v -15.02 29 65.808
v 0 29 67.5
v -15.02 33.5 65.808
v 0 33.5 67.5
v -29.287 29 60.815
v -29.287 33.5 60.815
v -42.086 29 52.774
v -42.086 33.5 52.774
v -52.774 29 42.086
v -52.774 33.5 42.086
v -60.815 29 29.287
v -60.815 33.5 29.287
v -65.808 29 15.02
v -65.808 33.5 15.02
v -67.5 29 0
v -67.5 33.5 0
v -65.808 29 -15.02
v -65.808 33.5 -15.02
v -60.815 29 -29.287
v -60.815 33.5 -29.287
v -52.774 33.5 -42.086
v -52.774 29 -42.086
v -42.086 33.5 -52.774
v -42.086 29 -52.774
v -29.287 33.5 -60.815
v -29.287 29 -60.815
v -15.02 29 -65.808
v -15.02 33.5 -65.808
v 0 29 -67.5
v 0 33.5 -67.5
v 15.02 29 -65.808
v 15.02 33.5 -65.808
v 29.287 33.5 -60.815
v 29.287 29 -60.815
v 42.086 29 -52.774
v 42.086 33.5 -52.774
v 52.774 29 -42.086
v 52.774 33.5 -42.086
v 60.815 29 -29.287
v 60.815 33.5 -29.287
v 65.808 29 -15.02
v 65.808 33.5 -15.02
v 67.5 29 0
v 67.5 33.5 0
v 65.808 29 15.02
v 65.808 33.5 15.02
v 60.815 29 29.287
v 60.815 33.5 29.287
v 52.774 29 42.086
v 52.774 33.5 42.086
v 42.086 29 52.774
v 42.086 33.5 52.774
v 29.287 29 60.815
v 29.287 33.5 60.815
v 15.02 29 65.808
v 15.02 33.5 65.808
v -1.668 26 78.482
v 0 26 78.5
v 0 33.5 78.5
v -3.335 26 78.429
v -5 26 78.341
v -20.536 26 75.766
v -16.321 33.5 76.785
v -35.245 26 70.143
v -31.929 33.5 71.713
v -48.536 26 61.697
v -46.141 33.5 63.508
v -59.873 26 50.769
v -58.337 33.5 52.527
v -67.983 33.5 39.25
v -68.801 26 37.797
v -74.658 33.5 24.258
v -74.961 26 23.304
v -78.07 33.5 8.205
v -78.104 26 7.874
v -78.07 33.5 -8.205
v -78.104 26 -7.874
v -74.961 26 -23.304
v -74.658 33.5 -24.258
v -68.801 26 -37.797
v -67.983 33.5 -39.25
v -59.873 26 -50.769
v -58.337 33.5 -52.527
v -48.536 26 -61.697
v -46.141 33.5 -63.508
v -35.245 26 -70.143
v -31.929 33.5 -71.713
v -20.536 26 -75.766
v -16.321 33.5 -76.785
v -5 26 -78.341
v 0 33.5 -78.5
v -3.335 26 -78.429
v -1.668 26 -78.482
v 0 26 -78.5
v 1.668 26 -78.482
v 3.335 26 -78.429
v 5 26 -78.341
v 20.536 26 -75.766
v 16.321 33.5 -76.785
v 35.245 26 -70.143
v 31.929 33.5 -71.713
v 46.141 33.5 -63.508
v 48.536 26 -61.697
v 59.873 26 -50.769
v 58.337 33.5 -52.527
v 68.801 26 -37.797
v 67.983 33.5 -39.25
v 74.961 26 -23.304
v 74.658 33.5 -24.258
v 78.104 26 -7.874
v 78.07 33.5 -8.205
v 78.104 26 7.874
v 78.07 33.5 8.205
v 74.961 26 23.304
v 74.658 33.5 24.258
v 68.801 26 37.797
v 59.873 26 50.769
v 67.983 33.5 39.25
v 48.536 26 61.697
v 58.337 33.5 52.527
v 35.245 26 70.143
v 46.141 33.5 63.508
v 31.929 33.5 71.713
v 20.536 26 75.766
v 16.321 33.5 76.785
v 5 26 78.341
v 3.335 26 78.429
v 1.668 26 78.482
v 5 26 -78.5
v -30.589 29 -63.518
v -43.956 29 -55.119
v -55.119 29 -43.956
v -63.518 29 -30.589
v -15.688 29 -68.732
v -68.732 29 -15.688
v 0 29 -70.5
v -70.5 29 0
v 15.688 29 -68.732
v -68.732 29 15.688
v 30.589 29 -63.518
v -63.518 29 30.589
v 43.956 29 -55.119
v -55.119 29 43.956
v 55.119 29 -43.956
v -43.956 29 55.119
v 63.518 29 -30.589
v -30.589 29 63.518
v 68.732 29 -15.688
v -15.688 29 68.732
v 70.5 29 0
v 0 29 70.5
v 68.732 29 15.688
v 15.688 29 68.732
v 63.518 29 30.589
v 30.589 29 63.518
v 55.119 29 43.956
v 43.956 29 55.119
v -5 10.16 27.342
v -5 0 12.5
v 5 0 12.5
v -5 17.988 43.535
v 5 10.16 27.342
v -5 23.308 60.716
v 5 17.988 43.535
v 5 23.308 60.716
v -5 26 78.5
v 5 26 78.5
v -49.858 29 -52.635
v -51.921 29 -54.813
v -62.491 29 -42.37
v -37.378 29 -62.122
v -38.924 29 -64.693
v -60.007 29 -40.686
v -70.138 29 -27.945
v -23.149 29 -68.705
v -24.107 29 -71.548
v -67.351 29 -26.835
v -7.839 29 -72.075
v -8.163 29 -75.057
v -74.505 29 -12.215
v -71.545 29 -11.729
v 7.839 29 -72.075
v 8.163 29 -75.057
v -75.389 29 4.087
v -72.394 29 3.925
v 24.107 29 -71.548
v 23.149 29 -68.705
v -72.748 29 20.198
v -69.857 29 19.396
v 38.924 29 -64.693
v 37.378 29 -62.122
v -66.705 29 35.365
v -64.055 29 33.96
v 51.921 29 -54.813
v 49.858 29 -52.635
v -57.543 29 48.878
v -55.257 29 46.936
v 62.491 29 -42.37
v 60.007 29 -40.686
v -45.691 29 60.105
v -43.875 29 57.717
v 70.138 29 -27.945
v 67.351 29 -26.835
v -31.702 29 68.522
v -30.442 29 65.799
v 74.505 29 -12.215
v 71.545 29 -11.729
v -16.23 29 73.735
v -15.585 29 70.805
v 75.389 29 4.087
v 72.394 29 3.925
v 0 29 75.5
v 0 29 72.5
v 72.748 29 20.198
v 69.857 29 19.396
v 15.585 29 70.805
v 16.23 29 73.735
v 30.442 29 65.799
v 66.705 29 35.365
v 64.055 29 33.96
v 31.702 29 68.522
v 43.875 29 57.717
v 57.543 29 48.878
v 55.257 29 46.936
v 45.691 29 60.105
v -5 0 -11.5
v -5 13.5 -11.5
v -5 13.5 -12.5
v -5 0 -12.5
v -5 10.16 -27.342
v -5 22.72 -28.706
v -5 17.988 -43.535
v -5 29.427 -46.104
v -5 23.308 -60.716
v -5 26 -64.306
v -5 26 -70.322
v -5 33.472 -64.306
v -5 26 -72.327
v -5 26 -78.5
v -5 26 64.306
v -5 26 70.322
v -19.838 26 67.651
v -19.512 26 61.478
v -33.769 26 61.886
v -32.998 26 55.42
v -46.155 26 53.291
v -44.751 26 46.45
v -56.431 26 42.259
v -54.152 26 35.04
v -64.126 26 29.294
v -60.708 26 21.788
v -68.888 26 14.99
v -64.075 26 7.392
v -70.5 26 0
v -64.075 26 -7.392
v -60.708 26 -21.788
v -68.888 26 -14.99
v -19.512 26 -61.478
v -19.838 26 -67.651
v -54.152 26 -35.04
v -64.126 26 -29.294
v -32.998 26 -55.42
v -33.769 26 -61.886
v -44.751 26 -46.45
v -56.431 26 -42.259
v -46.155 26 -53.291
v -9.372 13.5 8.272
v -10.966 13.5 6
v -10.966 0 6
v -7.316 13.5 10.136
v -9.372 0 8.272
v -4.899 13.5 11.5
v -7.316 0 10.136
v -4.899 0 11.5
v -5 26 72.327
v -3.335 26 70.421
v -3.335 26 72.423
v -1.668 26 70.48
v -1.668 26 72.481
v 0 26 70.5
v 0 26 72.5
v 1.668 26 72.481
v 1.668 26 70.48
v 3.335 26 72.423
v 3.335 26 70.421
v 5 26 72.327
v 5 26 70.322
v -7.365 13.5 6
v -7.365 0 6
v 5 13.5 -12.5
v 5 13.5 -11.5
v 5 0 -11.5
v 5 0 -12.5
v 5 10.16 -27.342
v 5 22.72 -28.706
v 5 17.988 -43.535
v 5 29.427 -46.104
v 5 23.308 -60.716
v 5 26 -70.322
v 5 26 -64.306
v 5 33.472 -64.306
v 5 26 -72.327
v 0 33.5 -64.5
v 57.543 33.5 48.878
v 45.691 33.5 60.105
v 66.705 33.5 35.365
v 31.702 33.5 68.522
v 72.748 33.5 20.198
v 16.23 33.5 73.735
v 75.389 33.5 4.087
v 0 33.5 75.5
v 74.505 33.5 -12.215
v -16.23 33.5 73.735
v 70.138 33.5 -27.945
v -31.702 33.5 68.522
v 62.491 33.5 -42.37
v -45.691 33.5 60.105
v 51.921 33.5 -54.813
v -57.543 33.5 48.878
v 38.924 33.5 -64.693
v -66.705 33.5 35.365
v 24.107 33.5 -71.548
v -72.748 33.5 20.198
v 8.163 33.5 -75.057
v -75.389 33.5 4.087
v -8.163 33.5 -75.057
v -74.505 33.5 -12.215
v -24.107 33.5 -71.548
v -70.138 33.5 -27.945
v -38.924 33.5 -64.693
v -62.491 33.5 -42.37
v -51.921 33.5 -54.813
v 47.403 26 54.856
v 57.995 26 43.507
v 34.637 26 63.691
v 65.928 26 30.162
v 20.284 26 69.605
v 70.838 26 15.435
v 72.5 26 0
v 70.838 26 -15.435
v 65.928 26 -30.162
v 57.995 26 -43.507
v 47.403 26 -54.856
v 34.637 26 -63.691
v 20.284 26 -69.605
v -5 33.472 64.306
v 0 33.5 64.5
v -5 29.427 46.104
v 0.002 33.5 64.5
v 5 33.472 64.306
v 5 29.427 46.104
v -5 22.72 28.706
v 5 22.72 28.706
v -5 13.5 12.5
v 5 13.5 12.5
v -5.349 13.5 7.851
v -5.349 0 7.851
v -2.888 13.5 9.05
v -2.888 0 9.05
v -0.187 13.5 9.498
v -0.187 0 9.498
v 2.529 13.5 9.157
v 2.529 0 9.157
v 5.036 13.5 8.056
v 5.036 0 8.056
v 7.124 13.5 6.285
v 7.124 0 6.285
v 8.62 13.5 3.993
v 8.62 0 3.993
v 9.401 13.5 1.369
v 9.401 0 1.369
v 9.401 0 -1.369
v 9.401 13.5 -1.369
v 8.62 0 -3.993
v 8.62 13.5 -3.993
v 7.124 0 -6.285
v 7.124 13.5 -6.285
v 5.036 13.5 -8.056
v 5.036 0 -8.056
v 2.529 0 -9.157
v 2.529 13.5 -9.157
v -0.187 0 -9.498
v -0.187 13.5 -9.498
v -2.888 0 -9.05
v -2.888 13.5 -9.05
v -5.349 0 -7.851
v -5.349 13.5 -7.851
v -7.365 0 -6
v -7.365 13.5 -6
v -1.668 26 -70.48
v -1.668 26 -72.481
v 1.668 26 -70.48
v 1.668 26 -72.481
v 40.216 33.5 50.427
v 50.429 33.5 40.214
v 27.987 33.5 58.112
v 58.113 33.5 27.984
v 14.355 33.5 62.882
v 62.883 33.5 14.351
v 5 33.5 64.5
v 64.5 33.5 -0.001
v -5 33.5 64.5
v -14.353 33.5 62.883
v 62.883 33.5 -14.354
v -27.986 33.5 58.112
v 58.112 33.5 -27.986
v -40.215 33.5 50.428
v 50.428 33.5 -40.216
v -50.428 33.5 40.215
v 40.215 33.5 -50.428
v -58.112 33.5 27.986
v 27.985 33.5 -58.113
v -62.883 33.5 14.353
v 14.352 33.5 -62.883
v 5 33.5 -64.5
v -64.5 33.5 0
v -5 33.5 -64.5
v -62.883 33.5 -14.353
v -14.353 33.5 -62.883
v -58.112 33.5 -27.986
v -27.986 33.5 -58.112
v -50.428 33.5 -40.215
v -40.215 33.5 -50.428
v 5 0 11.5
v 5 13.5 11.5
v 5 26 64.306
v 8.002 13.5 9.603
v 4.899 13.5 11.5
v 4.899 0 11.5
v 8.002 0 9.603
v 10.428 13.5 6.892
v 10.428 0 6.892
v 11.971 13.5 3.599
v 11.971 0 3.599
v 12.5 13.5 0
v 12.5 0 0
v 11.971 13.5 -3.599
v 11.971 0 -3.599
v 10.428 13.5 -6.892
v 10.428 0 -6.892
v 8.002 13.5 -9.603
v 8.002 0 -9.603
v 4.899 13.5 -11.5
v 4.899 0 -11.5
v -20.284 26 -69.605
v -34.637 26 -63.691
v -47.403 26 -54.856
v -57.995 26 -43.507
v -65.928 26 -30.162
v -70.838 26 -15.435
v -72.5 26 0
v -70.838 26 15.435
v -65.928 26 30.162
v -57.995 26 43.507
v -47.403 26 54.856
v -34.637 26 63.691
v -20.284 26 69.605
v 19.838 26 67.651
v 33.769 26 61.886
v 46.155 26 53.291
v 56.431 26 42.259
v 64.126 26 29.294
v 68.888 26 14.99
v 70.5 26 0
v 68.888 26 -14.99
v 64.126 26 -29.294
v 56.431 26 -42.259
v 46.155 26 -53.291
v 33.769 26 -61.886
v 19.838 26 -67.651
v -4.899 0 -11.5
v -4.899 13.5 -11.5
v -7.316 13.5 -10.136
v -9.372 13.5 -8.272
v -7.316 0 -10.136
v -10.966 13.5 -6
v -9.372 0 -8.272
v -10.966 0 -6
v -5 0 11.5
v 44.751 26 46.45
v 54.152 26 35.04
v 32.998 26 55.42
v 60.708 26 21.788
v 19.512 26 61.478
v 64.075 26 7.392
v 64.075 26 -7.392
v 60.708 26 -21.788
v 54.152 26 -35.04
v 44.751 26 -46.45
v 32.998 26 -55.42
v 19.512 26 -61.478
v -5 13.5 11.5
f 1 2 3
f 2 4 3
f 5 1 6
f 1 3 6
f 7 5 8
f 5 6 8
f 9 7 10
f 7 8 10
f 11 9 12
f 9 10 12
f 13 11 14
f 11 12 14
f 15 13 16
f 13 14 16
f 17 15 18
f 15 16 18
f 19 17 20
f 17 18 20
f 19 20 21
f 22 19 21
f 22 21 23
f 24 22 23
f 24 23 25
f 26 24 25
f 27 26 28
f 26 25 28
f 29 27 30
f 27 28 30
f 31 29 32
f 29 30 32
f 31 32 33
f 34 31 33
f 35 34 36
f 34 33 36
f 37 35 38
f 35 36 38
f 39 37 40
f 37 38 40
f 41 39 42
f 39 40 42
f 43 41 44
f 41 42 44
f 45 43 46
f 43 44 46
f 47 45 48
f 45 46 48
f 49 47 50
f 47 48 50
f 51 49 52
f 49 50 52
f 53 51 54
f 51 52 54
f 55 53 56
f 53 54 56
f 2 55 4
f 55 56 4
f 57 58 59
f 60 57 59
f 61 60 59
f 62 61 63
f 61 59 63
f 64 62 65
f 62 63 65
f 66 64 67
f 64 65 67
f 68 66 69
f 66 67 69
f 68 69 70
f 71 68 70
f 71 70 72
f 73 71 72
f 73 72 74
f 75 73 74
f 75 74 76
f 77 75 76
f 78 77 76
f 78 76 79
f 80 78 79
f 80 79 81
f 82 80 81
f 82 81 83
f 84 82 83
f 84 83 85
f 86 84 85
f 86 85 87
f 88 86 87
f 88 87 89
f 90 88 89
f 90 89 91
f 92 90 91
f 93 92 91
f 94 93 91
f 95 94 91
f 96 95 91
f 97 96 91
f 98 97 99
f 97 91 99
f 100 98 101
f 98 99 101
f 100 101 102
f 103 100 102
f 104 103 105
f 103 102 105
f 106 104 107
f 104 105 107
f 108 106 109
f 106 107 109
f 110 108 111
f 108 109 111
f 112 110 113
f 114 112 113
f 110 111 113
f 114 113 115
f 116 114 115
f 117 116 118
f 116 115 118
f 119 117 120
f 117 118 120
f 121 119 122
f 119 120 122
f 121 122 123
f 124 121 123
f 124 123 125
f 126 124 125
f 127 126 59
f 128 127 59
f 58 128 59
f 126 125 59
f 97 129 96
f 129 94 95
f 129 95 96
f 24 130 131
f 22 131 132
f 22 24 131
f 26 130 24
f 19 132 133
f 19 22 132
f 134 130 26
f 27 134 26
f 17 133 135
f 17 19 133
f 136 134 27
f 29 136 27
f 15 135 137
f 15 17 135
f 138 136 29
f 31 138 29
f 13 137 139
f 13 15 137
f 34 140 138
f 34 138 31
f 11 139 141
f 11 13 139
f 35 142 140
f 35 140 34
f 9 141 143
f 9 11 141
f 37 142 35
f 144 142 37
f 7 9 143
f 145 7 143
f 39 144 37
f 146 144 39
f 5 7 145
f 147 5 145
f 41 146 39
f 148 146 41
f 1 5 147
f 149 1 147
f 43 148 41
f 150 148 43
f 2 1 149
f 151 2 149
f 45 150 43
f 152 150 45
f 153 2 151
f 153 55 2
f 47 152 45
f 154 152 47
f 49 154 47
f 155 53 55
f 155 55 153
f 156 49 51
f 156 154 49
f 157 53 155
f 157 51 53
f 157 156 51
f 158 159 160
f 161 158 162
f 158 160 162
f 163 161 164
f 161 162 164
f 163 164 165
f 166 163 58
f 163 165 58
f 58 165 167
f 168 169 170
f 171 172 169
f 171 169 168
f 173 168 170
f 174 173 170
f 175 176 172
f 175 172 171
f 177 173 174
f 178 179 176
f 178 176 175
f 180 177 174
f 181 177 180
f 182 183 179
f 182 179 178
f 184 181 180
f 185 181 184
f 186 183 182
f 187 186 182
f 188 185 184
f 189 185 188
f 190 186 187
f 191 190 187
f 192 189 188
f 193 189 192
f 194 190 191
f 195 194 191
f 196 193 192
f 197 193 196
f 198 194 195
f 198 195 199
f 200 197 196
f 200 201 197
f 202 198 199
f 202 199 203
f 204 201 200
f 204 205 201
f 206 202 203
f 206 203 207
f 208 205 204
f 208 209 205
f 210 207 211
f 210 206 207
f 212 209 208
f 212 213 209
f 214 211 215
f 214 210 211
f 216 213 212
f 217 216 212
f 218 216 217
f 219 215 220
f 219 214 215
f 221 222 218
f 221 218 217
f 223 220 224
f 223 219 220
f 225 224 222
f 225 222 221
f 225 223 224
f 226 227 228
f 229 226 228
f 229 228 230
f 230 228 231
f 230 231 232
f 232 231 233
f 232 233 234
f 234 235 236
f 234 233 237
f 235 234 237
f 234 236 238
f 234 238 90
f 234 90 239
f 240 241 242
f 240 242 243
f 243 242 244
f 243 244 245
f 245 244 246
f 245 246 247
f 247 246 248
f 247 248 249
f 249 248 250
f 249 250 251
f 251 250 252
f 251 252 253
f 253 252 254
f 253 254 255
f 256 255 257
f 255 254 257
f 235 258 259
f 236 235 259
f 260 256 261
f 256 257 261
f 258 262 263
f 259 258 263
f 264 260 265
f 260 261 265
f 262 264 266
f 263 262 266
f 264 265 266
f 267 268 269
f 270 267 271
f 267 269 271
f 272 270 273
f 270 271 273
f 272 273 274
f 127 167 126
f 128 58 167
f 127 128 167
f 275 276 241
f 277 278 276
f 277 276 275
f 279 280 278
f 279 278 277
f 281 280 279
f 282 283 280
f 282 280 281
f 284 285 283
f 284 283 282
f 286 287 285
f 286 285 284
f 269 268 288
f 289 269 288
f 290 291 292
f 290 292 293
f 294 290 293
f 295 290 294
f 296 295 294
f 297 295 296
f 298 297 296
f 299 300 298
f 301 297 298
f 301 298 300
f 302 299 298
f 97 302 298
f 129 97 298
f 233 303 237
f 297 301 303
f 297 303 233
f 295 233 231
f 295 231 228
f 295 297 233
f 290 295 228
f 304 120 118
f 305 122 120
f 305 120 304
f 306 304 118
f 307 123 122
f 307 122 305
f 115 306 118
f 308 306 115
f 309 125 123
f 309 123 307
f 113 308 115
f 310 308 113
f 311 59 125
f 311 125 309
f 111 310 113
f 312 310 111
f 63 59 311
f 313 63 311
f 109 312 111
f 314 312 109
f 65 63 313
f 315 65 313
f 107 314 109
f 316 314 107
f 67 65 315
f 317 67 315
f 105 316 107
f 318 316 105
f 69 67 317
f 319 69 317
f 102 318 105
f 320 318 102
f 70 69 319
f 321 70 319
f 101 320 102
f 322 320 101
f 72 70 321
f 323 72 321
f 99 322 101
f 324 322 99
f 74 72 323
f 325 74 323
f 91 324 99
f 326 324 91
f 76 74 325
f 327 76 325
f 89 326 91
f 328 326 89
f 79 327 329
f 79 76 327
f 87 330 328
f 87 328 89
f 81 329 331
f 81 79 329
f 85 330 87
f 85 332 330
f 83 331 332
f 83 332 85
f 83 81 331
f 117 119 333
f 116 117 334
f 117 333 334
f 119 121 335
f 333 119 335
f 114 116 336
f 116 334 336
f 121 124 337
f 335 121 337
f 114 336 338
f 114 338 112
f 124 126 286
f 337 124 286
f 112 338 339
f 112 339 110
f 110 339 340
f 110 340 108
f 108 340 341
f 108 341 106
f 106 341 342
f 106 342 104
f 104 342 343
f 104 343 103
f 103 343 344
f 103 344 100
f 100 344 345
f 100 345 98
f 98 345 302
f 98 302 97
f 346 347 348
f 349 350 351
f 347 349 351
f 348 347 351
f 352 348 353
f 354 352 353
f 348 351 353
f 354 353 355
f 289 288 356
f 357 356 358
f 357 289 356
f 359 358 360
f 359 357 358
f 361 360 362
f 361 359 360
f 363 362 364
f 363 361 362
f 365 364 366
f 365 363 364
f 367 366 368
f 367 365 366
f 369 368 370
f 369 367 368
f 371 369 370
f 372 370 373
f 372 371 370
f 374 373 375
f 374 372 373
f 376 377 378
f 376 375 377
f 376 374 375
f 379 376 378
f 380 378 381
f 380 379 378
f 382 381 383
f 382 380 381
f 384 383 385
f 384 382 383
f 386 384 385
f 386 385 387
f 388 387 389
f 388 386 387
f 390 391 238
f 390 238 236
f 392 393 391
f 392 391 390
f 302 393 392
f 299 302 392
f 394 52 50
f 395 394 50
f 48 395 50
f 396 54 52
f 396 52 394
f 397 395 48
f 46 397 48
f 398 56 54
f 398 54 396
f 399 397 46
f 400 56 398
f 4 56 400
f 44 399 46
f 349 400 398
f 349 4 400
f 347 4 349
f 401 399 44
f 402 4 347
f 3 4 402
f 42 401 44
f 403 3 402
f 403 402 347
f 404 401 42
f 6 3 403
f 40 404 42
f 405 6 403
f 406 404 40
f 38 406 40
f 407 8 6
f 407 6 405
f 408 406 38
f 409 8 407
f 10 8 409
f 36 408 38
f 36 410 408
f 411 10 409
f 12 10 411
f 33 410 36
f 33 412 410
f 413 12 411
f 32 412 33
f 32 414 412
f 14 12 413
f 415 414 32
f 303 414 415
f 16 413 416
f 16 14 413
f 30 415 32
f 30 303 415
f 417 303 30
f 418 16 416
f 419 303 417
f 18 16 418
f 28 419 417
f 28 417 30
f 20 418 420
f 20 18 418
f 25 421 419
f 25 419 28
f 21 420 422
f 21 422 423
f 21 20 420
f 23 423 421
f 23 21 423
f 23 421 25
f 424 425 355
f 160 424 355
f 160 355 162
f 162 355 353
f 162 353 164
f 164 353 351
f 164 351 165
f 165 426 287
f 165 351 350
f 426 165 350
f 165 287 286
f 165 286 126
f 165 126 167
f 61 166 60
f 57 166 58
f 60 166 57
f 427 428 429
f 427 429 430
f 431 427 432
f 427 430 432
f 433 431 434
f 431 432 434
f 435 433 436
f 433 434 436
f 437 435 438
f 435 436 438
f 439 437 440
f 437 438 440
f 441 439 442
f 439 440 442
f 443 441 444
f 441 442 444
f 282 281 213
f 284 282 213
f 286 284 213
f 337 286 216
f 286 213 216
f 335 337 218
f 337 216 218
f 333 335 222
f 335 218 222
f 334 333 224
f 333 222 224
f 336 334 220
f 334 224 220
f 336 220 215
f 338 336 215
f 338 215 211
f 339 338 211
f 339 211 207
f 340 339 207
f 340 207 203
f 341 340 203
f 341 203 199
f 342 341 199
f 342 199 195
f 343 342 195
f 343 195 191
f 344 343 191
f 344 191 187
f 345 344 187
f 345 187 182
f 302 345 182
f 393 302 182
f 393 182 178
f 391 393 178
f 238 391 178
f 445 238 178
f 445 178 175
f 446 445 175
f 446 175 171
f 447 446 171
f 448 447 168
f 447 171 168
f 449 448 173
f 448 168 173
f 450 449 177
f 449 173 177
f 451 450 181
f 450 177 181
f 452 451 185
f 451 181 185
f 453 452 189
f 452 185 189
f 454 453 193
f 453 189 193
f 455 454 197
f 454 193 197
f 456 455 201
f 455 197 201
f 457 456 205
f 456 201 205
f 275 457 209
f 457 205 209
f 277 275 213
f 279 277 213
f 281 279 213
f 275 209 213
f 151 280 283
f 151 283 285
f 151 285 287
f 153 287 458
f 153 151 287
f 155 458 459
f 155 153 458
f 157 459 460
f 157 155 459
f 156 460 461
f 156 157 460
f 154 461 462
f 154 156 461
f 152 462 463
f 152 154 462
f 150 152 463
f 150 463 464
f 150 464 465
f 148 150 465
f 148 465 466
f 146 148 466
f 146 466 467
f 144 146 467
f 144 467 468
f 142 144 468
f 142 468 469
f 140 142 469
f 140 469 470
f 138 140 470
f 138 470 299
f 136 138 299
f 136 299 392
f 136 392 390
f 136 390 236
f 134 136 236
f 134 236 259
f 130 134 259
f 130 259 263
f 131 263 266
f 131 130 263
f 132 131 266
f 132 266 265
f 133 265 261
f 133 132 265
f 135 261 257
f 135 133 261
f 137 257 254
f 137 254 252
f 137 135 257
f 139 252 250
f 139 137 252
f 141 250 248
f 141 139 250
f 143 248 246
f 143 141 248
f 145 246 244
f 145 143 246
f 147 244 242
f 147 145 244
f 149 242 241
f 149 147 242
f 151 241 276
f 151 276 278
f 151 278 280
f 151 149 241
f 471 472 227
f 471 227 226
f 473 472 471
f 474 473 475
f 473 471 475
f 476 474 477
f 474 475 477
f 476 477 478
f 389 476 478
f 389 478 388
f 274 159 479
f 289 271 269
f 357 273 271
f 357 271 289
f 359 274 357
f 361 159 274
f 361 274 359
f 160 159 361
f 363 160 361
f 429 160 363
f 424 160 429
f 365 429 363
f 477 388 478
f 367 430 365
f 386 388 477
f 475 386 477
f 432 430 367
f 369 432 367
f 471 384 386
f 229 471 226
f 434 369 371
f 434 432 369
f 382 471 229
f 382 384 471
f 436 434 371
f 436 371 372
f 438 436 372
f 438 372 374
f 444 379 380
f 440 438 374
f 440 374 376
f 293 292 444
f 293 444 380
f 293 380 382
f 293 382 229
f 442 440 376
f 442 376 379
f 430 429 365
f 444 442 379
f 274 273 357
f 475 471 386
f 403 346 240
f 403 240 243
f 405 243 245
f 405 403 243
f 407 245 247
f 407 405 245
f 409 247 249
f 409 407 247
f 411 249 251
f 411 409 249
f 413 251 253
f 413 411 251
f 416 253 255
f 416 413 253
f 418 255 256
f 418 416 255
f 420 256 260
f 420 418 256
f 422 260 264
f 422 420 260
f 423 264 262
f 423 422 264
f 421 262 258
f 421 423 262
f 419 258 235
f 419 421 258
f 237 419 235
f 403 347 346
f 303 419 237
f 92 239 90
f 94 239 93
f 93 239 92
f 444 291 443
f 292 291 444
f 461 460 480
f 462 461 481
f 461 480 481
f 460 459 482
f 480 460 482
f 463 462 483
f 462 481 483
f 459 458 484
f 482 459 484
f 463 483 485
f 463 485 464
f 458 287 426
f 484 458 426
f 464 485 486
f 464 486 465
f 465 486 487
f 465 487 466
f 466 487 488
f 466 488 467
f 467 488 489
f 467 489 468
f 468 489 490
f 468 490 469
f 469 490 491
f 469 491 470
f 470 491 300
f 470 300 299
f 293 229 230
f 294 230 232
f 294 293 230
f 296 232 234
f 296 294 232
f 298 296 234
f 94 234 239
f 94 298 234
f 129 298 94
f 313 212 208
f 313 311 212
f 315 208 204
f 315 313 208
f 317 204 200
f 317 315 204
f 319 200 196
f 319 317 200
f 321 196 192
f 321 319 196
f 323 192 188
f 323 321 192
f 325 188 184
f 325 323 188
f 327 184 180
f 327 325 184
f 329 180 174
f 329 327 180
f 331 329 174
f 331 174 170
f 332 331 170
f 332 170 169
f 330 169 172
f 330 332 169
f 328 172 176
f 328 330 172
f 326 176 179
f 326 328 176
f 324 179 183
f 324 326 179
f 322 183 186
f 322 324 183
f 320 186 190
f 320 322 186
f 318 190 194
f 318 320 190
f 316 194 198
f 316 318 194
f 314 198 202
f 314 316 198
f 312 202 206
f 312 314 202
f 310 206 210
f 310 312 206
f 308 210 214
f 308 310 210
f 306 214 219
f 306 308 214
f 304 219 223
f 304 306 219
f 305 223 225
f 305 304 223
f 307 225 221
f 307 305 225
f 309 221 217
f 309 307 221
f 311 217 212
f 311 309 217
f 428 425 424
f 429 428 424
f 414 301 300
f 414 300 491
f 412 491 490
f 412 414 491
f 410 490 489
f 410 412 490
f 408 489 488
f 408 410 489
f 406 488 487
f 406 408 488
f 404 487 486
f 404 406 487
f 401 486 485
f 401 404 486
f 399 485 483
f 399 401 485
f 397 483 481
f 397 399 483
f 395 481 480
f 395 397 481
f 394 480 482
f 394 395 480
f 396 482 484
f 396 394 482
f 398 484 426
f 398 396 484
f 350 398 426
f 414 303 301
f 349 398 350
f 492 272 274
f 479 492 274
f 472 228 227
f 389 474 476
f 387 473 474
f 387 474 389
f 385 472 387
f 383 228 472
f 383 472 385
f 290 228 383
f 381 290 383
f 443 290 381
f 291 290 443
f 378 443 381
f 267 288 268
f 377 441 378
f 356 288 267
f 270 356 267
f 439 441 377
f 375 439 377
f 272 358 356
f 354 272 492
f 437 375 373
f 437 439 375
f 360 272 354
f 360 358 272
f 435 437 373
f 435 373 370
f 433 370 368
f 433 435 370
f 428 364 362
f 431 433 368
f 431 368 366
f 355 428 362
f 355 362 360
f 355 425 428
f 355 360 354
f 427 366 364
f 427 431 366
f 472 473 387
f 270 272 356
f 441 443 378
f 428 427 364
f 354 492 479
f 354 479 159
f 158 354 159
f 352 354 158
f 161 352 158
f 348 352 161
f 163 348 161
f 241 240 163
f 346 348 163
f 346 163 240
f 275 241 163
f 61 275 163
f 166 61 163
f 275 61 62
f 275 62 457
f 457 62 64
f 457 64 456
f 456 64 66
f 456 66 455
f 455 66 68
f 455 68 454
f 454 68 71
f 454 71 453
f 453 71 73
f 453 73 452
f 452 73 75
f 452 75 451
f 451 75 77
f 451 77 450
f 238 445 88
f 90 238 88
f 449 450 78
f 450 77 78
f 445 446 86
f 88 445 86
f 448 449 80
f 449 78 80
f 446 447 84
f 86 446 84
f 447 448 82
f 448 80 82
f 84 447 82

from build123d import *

# Parameters (mm, degrees)
SCHIZZO1_R                   = 12.5
SCHIZZO1_R_2                 = 9.5
ESTRUSIONE_ESTRUSIONE1_DEPTH = 13.5
SCHIZZO2_W                   = 9
SCHIZZO2_H                   = 12
TAGLIO_ESTRUSIONE1_DEPTH     = 23.24297642
ESTRUSIONE_ESTRUSIONE2_DEPTH = 5
SCHIZZO3_R                   = 75.5
SCHIZZO3_R_2                 = 67.5
BOSS_EXTRUDE1_DEPTH          = 3
SKETCH1_W                    = 3
SKETCH1_H                    = 7.5
SKETCH2_R                    = 72.5
SKETCH2_R_2                  = 70.5
CUT_EXTRUDE1_DEPTH           = 3


with BuildPart() as part:
    # Schizzo1 → Estrusione-Estrusione1 (new body)
    with BuildSketch(Plane(origin=(0, 0, 0), x_dir=(1, 0, 0), z_dir=(0, 1, 0))):
        with Locations(Location((0, 0, 0), (0, 0, 270))):
            Circle(SCHIZZO1_R)
        with Locations(Location((0, 0, 0), (0, 0, 270))):
            Circle(SCHIZZO1_R_2, mode=Mode.SUBTRACT)
    extrude(amount=ESTRUSIONE_ESTRUSIONE1_DEPTH)

    # Schizzo2 → Taglio-Estrusione1 (cut, through all)
    with BuildSketch(Plane(origin=(0, 13.5, 0), x_dir=(1, 0, 0), z_dir=(0, 1, 0))):
        with Locations((-11.865459931, 0)):
            Rectangle(SCHIZZO2_W, SCHIZZO2_H)
    extrude(amount=-TAGLIO_ESTRUSIONE1_DEPTH, mode=Mode.SUBTRACT)

    # Schizzo5 → Estrusione-Estrusione2 (add, symmetric)
    with BuildSketch(Plane(origin=(0, 0, 0), x_dir=(0, 0, -1), z_dir=(1, 0, 0))):
        with BuildLine():
            Line((-64.5, 26), (-64.5, 33.5))
            ThreePointArc((-64.5, 33.5), (-37.371539554, 26.433997159), (-12.5, 13.5))
            Line((-12.5, 13.5), (-11.5, 13.5))
            Line((-11.5, 13.5), (-11.5, 0))
            Line((-11.5, 0), (-12.5, 0))
            ThreePointArc((-12.5, 0), (-43.534901683, 17.988326497), (-78.5, 26))
            Line((-78.5, 26), (-64.5, 26))
        make_face()
    estrusione_estrusione2 = extrude(amount=ESTRUSIONE_ESTRUSIONE2_DEPTH, both=True)

    # Schizzo3 → Boss-Extrude1 (add)
    with BuildSketch(Plane(origin=(0, 26, 0), x_dir=(1, 0, 0), z_dir=(0, 1, 0))):
        with Locations(Location((0, 0, 0), (0, 0, 266.202798448))):
            Circle(SCHIZZO3_R)
        with Locations(Location((0, 0, 0), (0, 0, 265.751977333))):
            Circle(SCHIZZO3_R_2, mode=Mode.SUBTRACT)
    extrude(amount=BOSS_EXTRUDE1_DEPTH)

    # Sketch1 → Revolve1 (revolve)
    with BuildSketch(Plane(origin=(0, 0, 0), x_dir=(0, 0, -1), z_dir=(1, 0, 0)), mode=Mode.PRIVATE) as revolve1_sk:
        with Locations((77, 29.75)):
            Rectangle(SKETCH1_W, SKETCH1_H)
        with Locations((66, 29.75)):
            Rectangle(SKETCH1_W, SKETCH1_H)
    revolve(revolve1_sk.sketch.rotate(Axis((0, 39.375, 0), (0, -1, 0)), 180), axis=Axis((0, 39.375, 0), (0, -1, 0)))

    # Mirror1: Estrusione-Estrusione2 across plane
    add(estrusione_estrusione2.mirror(Plane.XY))

    # Sketch2 → Cut-Extrude1 (cut)
    with BuildSketch(Plane(origin=(0, 29, 0), x_dir=(1, 0, 0), z_dir=(0, 1, 0))):
        with Locations(Location((0, 0, 0), (0, 0, 270))):
            Circle(SKETCH2_R)
        with Locations(Location((0, 0, 0), (0, 0, 270))):
            Circle(SKETCH2_R_2, mode=Mode.SUBTRACT)
    extrude(amount=-CUT_EXTRUDE1_DEPTH, mode=Mode.SUBTRACT)


solid = part.part
